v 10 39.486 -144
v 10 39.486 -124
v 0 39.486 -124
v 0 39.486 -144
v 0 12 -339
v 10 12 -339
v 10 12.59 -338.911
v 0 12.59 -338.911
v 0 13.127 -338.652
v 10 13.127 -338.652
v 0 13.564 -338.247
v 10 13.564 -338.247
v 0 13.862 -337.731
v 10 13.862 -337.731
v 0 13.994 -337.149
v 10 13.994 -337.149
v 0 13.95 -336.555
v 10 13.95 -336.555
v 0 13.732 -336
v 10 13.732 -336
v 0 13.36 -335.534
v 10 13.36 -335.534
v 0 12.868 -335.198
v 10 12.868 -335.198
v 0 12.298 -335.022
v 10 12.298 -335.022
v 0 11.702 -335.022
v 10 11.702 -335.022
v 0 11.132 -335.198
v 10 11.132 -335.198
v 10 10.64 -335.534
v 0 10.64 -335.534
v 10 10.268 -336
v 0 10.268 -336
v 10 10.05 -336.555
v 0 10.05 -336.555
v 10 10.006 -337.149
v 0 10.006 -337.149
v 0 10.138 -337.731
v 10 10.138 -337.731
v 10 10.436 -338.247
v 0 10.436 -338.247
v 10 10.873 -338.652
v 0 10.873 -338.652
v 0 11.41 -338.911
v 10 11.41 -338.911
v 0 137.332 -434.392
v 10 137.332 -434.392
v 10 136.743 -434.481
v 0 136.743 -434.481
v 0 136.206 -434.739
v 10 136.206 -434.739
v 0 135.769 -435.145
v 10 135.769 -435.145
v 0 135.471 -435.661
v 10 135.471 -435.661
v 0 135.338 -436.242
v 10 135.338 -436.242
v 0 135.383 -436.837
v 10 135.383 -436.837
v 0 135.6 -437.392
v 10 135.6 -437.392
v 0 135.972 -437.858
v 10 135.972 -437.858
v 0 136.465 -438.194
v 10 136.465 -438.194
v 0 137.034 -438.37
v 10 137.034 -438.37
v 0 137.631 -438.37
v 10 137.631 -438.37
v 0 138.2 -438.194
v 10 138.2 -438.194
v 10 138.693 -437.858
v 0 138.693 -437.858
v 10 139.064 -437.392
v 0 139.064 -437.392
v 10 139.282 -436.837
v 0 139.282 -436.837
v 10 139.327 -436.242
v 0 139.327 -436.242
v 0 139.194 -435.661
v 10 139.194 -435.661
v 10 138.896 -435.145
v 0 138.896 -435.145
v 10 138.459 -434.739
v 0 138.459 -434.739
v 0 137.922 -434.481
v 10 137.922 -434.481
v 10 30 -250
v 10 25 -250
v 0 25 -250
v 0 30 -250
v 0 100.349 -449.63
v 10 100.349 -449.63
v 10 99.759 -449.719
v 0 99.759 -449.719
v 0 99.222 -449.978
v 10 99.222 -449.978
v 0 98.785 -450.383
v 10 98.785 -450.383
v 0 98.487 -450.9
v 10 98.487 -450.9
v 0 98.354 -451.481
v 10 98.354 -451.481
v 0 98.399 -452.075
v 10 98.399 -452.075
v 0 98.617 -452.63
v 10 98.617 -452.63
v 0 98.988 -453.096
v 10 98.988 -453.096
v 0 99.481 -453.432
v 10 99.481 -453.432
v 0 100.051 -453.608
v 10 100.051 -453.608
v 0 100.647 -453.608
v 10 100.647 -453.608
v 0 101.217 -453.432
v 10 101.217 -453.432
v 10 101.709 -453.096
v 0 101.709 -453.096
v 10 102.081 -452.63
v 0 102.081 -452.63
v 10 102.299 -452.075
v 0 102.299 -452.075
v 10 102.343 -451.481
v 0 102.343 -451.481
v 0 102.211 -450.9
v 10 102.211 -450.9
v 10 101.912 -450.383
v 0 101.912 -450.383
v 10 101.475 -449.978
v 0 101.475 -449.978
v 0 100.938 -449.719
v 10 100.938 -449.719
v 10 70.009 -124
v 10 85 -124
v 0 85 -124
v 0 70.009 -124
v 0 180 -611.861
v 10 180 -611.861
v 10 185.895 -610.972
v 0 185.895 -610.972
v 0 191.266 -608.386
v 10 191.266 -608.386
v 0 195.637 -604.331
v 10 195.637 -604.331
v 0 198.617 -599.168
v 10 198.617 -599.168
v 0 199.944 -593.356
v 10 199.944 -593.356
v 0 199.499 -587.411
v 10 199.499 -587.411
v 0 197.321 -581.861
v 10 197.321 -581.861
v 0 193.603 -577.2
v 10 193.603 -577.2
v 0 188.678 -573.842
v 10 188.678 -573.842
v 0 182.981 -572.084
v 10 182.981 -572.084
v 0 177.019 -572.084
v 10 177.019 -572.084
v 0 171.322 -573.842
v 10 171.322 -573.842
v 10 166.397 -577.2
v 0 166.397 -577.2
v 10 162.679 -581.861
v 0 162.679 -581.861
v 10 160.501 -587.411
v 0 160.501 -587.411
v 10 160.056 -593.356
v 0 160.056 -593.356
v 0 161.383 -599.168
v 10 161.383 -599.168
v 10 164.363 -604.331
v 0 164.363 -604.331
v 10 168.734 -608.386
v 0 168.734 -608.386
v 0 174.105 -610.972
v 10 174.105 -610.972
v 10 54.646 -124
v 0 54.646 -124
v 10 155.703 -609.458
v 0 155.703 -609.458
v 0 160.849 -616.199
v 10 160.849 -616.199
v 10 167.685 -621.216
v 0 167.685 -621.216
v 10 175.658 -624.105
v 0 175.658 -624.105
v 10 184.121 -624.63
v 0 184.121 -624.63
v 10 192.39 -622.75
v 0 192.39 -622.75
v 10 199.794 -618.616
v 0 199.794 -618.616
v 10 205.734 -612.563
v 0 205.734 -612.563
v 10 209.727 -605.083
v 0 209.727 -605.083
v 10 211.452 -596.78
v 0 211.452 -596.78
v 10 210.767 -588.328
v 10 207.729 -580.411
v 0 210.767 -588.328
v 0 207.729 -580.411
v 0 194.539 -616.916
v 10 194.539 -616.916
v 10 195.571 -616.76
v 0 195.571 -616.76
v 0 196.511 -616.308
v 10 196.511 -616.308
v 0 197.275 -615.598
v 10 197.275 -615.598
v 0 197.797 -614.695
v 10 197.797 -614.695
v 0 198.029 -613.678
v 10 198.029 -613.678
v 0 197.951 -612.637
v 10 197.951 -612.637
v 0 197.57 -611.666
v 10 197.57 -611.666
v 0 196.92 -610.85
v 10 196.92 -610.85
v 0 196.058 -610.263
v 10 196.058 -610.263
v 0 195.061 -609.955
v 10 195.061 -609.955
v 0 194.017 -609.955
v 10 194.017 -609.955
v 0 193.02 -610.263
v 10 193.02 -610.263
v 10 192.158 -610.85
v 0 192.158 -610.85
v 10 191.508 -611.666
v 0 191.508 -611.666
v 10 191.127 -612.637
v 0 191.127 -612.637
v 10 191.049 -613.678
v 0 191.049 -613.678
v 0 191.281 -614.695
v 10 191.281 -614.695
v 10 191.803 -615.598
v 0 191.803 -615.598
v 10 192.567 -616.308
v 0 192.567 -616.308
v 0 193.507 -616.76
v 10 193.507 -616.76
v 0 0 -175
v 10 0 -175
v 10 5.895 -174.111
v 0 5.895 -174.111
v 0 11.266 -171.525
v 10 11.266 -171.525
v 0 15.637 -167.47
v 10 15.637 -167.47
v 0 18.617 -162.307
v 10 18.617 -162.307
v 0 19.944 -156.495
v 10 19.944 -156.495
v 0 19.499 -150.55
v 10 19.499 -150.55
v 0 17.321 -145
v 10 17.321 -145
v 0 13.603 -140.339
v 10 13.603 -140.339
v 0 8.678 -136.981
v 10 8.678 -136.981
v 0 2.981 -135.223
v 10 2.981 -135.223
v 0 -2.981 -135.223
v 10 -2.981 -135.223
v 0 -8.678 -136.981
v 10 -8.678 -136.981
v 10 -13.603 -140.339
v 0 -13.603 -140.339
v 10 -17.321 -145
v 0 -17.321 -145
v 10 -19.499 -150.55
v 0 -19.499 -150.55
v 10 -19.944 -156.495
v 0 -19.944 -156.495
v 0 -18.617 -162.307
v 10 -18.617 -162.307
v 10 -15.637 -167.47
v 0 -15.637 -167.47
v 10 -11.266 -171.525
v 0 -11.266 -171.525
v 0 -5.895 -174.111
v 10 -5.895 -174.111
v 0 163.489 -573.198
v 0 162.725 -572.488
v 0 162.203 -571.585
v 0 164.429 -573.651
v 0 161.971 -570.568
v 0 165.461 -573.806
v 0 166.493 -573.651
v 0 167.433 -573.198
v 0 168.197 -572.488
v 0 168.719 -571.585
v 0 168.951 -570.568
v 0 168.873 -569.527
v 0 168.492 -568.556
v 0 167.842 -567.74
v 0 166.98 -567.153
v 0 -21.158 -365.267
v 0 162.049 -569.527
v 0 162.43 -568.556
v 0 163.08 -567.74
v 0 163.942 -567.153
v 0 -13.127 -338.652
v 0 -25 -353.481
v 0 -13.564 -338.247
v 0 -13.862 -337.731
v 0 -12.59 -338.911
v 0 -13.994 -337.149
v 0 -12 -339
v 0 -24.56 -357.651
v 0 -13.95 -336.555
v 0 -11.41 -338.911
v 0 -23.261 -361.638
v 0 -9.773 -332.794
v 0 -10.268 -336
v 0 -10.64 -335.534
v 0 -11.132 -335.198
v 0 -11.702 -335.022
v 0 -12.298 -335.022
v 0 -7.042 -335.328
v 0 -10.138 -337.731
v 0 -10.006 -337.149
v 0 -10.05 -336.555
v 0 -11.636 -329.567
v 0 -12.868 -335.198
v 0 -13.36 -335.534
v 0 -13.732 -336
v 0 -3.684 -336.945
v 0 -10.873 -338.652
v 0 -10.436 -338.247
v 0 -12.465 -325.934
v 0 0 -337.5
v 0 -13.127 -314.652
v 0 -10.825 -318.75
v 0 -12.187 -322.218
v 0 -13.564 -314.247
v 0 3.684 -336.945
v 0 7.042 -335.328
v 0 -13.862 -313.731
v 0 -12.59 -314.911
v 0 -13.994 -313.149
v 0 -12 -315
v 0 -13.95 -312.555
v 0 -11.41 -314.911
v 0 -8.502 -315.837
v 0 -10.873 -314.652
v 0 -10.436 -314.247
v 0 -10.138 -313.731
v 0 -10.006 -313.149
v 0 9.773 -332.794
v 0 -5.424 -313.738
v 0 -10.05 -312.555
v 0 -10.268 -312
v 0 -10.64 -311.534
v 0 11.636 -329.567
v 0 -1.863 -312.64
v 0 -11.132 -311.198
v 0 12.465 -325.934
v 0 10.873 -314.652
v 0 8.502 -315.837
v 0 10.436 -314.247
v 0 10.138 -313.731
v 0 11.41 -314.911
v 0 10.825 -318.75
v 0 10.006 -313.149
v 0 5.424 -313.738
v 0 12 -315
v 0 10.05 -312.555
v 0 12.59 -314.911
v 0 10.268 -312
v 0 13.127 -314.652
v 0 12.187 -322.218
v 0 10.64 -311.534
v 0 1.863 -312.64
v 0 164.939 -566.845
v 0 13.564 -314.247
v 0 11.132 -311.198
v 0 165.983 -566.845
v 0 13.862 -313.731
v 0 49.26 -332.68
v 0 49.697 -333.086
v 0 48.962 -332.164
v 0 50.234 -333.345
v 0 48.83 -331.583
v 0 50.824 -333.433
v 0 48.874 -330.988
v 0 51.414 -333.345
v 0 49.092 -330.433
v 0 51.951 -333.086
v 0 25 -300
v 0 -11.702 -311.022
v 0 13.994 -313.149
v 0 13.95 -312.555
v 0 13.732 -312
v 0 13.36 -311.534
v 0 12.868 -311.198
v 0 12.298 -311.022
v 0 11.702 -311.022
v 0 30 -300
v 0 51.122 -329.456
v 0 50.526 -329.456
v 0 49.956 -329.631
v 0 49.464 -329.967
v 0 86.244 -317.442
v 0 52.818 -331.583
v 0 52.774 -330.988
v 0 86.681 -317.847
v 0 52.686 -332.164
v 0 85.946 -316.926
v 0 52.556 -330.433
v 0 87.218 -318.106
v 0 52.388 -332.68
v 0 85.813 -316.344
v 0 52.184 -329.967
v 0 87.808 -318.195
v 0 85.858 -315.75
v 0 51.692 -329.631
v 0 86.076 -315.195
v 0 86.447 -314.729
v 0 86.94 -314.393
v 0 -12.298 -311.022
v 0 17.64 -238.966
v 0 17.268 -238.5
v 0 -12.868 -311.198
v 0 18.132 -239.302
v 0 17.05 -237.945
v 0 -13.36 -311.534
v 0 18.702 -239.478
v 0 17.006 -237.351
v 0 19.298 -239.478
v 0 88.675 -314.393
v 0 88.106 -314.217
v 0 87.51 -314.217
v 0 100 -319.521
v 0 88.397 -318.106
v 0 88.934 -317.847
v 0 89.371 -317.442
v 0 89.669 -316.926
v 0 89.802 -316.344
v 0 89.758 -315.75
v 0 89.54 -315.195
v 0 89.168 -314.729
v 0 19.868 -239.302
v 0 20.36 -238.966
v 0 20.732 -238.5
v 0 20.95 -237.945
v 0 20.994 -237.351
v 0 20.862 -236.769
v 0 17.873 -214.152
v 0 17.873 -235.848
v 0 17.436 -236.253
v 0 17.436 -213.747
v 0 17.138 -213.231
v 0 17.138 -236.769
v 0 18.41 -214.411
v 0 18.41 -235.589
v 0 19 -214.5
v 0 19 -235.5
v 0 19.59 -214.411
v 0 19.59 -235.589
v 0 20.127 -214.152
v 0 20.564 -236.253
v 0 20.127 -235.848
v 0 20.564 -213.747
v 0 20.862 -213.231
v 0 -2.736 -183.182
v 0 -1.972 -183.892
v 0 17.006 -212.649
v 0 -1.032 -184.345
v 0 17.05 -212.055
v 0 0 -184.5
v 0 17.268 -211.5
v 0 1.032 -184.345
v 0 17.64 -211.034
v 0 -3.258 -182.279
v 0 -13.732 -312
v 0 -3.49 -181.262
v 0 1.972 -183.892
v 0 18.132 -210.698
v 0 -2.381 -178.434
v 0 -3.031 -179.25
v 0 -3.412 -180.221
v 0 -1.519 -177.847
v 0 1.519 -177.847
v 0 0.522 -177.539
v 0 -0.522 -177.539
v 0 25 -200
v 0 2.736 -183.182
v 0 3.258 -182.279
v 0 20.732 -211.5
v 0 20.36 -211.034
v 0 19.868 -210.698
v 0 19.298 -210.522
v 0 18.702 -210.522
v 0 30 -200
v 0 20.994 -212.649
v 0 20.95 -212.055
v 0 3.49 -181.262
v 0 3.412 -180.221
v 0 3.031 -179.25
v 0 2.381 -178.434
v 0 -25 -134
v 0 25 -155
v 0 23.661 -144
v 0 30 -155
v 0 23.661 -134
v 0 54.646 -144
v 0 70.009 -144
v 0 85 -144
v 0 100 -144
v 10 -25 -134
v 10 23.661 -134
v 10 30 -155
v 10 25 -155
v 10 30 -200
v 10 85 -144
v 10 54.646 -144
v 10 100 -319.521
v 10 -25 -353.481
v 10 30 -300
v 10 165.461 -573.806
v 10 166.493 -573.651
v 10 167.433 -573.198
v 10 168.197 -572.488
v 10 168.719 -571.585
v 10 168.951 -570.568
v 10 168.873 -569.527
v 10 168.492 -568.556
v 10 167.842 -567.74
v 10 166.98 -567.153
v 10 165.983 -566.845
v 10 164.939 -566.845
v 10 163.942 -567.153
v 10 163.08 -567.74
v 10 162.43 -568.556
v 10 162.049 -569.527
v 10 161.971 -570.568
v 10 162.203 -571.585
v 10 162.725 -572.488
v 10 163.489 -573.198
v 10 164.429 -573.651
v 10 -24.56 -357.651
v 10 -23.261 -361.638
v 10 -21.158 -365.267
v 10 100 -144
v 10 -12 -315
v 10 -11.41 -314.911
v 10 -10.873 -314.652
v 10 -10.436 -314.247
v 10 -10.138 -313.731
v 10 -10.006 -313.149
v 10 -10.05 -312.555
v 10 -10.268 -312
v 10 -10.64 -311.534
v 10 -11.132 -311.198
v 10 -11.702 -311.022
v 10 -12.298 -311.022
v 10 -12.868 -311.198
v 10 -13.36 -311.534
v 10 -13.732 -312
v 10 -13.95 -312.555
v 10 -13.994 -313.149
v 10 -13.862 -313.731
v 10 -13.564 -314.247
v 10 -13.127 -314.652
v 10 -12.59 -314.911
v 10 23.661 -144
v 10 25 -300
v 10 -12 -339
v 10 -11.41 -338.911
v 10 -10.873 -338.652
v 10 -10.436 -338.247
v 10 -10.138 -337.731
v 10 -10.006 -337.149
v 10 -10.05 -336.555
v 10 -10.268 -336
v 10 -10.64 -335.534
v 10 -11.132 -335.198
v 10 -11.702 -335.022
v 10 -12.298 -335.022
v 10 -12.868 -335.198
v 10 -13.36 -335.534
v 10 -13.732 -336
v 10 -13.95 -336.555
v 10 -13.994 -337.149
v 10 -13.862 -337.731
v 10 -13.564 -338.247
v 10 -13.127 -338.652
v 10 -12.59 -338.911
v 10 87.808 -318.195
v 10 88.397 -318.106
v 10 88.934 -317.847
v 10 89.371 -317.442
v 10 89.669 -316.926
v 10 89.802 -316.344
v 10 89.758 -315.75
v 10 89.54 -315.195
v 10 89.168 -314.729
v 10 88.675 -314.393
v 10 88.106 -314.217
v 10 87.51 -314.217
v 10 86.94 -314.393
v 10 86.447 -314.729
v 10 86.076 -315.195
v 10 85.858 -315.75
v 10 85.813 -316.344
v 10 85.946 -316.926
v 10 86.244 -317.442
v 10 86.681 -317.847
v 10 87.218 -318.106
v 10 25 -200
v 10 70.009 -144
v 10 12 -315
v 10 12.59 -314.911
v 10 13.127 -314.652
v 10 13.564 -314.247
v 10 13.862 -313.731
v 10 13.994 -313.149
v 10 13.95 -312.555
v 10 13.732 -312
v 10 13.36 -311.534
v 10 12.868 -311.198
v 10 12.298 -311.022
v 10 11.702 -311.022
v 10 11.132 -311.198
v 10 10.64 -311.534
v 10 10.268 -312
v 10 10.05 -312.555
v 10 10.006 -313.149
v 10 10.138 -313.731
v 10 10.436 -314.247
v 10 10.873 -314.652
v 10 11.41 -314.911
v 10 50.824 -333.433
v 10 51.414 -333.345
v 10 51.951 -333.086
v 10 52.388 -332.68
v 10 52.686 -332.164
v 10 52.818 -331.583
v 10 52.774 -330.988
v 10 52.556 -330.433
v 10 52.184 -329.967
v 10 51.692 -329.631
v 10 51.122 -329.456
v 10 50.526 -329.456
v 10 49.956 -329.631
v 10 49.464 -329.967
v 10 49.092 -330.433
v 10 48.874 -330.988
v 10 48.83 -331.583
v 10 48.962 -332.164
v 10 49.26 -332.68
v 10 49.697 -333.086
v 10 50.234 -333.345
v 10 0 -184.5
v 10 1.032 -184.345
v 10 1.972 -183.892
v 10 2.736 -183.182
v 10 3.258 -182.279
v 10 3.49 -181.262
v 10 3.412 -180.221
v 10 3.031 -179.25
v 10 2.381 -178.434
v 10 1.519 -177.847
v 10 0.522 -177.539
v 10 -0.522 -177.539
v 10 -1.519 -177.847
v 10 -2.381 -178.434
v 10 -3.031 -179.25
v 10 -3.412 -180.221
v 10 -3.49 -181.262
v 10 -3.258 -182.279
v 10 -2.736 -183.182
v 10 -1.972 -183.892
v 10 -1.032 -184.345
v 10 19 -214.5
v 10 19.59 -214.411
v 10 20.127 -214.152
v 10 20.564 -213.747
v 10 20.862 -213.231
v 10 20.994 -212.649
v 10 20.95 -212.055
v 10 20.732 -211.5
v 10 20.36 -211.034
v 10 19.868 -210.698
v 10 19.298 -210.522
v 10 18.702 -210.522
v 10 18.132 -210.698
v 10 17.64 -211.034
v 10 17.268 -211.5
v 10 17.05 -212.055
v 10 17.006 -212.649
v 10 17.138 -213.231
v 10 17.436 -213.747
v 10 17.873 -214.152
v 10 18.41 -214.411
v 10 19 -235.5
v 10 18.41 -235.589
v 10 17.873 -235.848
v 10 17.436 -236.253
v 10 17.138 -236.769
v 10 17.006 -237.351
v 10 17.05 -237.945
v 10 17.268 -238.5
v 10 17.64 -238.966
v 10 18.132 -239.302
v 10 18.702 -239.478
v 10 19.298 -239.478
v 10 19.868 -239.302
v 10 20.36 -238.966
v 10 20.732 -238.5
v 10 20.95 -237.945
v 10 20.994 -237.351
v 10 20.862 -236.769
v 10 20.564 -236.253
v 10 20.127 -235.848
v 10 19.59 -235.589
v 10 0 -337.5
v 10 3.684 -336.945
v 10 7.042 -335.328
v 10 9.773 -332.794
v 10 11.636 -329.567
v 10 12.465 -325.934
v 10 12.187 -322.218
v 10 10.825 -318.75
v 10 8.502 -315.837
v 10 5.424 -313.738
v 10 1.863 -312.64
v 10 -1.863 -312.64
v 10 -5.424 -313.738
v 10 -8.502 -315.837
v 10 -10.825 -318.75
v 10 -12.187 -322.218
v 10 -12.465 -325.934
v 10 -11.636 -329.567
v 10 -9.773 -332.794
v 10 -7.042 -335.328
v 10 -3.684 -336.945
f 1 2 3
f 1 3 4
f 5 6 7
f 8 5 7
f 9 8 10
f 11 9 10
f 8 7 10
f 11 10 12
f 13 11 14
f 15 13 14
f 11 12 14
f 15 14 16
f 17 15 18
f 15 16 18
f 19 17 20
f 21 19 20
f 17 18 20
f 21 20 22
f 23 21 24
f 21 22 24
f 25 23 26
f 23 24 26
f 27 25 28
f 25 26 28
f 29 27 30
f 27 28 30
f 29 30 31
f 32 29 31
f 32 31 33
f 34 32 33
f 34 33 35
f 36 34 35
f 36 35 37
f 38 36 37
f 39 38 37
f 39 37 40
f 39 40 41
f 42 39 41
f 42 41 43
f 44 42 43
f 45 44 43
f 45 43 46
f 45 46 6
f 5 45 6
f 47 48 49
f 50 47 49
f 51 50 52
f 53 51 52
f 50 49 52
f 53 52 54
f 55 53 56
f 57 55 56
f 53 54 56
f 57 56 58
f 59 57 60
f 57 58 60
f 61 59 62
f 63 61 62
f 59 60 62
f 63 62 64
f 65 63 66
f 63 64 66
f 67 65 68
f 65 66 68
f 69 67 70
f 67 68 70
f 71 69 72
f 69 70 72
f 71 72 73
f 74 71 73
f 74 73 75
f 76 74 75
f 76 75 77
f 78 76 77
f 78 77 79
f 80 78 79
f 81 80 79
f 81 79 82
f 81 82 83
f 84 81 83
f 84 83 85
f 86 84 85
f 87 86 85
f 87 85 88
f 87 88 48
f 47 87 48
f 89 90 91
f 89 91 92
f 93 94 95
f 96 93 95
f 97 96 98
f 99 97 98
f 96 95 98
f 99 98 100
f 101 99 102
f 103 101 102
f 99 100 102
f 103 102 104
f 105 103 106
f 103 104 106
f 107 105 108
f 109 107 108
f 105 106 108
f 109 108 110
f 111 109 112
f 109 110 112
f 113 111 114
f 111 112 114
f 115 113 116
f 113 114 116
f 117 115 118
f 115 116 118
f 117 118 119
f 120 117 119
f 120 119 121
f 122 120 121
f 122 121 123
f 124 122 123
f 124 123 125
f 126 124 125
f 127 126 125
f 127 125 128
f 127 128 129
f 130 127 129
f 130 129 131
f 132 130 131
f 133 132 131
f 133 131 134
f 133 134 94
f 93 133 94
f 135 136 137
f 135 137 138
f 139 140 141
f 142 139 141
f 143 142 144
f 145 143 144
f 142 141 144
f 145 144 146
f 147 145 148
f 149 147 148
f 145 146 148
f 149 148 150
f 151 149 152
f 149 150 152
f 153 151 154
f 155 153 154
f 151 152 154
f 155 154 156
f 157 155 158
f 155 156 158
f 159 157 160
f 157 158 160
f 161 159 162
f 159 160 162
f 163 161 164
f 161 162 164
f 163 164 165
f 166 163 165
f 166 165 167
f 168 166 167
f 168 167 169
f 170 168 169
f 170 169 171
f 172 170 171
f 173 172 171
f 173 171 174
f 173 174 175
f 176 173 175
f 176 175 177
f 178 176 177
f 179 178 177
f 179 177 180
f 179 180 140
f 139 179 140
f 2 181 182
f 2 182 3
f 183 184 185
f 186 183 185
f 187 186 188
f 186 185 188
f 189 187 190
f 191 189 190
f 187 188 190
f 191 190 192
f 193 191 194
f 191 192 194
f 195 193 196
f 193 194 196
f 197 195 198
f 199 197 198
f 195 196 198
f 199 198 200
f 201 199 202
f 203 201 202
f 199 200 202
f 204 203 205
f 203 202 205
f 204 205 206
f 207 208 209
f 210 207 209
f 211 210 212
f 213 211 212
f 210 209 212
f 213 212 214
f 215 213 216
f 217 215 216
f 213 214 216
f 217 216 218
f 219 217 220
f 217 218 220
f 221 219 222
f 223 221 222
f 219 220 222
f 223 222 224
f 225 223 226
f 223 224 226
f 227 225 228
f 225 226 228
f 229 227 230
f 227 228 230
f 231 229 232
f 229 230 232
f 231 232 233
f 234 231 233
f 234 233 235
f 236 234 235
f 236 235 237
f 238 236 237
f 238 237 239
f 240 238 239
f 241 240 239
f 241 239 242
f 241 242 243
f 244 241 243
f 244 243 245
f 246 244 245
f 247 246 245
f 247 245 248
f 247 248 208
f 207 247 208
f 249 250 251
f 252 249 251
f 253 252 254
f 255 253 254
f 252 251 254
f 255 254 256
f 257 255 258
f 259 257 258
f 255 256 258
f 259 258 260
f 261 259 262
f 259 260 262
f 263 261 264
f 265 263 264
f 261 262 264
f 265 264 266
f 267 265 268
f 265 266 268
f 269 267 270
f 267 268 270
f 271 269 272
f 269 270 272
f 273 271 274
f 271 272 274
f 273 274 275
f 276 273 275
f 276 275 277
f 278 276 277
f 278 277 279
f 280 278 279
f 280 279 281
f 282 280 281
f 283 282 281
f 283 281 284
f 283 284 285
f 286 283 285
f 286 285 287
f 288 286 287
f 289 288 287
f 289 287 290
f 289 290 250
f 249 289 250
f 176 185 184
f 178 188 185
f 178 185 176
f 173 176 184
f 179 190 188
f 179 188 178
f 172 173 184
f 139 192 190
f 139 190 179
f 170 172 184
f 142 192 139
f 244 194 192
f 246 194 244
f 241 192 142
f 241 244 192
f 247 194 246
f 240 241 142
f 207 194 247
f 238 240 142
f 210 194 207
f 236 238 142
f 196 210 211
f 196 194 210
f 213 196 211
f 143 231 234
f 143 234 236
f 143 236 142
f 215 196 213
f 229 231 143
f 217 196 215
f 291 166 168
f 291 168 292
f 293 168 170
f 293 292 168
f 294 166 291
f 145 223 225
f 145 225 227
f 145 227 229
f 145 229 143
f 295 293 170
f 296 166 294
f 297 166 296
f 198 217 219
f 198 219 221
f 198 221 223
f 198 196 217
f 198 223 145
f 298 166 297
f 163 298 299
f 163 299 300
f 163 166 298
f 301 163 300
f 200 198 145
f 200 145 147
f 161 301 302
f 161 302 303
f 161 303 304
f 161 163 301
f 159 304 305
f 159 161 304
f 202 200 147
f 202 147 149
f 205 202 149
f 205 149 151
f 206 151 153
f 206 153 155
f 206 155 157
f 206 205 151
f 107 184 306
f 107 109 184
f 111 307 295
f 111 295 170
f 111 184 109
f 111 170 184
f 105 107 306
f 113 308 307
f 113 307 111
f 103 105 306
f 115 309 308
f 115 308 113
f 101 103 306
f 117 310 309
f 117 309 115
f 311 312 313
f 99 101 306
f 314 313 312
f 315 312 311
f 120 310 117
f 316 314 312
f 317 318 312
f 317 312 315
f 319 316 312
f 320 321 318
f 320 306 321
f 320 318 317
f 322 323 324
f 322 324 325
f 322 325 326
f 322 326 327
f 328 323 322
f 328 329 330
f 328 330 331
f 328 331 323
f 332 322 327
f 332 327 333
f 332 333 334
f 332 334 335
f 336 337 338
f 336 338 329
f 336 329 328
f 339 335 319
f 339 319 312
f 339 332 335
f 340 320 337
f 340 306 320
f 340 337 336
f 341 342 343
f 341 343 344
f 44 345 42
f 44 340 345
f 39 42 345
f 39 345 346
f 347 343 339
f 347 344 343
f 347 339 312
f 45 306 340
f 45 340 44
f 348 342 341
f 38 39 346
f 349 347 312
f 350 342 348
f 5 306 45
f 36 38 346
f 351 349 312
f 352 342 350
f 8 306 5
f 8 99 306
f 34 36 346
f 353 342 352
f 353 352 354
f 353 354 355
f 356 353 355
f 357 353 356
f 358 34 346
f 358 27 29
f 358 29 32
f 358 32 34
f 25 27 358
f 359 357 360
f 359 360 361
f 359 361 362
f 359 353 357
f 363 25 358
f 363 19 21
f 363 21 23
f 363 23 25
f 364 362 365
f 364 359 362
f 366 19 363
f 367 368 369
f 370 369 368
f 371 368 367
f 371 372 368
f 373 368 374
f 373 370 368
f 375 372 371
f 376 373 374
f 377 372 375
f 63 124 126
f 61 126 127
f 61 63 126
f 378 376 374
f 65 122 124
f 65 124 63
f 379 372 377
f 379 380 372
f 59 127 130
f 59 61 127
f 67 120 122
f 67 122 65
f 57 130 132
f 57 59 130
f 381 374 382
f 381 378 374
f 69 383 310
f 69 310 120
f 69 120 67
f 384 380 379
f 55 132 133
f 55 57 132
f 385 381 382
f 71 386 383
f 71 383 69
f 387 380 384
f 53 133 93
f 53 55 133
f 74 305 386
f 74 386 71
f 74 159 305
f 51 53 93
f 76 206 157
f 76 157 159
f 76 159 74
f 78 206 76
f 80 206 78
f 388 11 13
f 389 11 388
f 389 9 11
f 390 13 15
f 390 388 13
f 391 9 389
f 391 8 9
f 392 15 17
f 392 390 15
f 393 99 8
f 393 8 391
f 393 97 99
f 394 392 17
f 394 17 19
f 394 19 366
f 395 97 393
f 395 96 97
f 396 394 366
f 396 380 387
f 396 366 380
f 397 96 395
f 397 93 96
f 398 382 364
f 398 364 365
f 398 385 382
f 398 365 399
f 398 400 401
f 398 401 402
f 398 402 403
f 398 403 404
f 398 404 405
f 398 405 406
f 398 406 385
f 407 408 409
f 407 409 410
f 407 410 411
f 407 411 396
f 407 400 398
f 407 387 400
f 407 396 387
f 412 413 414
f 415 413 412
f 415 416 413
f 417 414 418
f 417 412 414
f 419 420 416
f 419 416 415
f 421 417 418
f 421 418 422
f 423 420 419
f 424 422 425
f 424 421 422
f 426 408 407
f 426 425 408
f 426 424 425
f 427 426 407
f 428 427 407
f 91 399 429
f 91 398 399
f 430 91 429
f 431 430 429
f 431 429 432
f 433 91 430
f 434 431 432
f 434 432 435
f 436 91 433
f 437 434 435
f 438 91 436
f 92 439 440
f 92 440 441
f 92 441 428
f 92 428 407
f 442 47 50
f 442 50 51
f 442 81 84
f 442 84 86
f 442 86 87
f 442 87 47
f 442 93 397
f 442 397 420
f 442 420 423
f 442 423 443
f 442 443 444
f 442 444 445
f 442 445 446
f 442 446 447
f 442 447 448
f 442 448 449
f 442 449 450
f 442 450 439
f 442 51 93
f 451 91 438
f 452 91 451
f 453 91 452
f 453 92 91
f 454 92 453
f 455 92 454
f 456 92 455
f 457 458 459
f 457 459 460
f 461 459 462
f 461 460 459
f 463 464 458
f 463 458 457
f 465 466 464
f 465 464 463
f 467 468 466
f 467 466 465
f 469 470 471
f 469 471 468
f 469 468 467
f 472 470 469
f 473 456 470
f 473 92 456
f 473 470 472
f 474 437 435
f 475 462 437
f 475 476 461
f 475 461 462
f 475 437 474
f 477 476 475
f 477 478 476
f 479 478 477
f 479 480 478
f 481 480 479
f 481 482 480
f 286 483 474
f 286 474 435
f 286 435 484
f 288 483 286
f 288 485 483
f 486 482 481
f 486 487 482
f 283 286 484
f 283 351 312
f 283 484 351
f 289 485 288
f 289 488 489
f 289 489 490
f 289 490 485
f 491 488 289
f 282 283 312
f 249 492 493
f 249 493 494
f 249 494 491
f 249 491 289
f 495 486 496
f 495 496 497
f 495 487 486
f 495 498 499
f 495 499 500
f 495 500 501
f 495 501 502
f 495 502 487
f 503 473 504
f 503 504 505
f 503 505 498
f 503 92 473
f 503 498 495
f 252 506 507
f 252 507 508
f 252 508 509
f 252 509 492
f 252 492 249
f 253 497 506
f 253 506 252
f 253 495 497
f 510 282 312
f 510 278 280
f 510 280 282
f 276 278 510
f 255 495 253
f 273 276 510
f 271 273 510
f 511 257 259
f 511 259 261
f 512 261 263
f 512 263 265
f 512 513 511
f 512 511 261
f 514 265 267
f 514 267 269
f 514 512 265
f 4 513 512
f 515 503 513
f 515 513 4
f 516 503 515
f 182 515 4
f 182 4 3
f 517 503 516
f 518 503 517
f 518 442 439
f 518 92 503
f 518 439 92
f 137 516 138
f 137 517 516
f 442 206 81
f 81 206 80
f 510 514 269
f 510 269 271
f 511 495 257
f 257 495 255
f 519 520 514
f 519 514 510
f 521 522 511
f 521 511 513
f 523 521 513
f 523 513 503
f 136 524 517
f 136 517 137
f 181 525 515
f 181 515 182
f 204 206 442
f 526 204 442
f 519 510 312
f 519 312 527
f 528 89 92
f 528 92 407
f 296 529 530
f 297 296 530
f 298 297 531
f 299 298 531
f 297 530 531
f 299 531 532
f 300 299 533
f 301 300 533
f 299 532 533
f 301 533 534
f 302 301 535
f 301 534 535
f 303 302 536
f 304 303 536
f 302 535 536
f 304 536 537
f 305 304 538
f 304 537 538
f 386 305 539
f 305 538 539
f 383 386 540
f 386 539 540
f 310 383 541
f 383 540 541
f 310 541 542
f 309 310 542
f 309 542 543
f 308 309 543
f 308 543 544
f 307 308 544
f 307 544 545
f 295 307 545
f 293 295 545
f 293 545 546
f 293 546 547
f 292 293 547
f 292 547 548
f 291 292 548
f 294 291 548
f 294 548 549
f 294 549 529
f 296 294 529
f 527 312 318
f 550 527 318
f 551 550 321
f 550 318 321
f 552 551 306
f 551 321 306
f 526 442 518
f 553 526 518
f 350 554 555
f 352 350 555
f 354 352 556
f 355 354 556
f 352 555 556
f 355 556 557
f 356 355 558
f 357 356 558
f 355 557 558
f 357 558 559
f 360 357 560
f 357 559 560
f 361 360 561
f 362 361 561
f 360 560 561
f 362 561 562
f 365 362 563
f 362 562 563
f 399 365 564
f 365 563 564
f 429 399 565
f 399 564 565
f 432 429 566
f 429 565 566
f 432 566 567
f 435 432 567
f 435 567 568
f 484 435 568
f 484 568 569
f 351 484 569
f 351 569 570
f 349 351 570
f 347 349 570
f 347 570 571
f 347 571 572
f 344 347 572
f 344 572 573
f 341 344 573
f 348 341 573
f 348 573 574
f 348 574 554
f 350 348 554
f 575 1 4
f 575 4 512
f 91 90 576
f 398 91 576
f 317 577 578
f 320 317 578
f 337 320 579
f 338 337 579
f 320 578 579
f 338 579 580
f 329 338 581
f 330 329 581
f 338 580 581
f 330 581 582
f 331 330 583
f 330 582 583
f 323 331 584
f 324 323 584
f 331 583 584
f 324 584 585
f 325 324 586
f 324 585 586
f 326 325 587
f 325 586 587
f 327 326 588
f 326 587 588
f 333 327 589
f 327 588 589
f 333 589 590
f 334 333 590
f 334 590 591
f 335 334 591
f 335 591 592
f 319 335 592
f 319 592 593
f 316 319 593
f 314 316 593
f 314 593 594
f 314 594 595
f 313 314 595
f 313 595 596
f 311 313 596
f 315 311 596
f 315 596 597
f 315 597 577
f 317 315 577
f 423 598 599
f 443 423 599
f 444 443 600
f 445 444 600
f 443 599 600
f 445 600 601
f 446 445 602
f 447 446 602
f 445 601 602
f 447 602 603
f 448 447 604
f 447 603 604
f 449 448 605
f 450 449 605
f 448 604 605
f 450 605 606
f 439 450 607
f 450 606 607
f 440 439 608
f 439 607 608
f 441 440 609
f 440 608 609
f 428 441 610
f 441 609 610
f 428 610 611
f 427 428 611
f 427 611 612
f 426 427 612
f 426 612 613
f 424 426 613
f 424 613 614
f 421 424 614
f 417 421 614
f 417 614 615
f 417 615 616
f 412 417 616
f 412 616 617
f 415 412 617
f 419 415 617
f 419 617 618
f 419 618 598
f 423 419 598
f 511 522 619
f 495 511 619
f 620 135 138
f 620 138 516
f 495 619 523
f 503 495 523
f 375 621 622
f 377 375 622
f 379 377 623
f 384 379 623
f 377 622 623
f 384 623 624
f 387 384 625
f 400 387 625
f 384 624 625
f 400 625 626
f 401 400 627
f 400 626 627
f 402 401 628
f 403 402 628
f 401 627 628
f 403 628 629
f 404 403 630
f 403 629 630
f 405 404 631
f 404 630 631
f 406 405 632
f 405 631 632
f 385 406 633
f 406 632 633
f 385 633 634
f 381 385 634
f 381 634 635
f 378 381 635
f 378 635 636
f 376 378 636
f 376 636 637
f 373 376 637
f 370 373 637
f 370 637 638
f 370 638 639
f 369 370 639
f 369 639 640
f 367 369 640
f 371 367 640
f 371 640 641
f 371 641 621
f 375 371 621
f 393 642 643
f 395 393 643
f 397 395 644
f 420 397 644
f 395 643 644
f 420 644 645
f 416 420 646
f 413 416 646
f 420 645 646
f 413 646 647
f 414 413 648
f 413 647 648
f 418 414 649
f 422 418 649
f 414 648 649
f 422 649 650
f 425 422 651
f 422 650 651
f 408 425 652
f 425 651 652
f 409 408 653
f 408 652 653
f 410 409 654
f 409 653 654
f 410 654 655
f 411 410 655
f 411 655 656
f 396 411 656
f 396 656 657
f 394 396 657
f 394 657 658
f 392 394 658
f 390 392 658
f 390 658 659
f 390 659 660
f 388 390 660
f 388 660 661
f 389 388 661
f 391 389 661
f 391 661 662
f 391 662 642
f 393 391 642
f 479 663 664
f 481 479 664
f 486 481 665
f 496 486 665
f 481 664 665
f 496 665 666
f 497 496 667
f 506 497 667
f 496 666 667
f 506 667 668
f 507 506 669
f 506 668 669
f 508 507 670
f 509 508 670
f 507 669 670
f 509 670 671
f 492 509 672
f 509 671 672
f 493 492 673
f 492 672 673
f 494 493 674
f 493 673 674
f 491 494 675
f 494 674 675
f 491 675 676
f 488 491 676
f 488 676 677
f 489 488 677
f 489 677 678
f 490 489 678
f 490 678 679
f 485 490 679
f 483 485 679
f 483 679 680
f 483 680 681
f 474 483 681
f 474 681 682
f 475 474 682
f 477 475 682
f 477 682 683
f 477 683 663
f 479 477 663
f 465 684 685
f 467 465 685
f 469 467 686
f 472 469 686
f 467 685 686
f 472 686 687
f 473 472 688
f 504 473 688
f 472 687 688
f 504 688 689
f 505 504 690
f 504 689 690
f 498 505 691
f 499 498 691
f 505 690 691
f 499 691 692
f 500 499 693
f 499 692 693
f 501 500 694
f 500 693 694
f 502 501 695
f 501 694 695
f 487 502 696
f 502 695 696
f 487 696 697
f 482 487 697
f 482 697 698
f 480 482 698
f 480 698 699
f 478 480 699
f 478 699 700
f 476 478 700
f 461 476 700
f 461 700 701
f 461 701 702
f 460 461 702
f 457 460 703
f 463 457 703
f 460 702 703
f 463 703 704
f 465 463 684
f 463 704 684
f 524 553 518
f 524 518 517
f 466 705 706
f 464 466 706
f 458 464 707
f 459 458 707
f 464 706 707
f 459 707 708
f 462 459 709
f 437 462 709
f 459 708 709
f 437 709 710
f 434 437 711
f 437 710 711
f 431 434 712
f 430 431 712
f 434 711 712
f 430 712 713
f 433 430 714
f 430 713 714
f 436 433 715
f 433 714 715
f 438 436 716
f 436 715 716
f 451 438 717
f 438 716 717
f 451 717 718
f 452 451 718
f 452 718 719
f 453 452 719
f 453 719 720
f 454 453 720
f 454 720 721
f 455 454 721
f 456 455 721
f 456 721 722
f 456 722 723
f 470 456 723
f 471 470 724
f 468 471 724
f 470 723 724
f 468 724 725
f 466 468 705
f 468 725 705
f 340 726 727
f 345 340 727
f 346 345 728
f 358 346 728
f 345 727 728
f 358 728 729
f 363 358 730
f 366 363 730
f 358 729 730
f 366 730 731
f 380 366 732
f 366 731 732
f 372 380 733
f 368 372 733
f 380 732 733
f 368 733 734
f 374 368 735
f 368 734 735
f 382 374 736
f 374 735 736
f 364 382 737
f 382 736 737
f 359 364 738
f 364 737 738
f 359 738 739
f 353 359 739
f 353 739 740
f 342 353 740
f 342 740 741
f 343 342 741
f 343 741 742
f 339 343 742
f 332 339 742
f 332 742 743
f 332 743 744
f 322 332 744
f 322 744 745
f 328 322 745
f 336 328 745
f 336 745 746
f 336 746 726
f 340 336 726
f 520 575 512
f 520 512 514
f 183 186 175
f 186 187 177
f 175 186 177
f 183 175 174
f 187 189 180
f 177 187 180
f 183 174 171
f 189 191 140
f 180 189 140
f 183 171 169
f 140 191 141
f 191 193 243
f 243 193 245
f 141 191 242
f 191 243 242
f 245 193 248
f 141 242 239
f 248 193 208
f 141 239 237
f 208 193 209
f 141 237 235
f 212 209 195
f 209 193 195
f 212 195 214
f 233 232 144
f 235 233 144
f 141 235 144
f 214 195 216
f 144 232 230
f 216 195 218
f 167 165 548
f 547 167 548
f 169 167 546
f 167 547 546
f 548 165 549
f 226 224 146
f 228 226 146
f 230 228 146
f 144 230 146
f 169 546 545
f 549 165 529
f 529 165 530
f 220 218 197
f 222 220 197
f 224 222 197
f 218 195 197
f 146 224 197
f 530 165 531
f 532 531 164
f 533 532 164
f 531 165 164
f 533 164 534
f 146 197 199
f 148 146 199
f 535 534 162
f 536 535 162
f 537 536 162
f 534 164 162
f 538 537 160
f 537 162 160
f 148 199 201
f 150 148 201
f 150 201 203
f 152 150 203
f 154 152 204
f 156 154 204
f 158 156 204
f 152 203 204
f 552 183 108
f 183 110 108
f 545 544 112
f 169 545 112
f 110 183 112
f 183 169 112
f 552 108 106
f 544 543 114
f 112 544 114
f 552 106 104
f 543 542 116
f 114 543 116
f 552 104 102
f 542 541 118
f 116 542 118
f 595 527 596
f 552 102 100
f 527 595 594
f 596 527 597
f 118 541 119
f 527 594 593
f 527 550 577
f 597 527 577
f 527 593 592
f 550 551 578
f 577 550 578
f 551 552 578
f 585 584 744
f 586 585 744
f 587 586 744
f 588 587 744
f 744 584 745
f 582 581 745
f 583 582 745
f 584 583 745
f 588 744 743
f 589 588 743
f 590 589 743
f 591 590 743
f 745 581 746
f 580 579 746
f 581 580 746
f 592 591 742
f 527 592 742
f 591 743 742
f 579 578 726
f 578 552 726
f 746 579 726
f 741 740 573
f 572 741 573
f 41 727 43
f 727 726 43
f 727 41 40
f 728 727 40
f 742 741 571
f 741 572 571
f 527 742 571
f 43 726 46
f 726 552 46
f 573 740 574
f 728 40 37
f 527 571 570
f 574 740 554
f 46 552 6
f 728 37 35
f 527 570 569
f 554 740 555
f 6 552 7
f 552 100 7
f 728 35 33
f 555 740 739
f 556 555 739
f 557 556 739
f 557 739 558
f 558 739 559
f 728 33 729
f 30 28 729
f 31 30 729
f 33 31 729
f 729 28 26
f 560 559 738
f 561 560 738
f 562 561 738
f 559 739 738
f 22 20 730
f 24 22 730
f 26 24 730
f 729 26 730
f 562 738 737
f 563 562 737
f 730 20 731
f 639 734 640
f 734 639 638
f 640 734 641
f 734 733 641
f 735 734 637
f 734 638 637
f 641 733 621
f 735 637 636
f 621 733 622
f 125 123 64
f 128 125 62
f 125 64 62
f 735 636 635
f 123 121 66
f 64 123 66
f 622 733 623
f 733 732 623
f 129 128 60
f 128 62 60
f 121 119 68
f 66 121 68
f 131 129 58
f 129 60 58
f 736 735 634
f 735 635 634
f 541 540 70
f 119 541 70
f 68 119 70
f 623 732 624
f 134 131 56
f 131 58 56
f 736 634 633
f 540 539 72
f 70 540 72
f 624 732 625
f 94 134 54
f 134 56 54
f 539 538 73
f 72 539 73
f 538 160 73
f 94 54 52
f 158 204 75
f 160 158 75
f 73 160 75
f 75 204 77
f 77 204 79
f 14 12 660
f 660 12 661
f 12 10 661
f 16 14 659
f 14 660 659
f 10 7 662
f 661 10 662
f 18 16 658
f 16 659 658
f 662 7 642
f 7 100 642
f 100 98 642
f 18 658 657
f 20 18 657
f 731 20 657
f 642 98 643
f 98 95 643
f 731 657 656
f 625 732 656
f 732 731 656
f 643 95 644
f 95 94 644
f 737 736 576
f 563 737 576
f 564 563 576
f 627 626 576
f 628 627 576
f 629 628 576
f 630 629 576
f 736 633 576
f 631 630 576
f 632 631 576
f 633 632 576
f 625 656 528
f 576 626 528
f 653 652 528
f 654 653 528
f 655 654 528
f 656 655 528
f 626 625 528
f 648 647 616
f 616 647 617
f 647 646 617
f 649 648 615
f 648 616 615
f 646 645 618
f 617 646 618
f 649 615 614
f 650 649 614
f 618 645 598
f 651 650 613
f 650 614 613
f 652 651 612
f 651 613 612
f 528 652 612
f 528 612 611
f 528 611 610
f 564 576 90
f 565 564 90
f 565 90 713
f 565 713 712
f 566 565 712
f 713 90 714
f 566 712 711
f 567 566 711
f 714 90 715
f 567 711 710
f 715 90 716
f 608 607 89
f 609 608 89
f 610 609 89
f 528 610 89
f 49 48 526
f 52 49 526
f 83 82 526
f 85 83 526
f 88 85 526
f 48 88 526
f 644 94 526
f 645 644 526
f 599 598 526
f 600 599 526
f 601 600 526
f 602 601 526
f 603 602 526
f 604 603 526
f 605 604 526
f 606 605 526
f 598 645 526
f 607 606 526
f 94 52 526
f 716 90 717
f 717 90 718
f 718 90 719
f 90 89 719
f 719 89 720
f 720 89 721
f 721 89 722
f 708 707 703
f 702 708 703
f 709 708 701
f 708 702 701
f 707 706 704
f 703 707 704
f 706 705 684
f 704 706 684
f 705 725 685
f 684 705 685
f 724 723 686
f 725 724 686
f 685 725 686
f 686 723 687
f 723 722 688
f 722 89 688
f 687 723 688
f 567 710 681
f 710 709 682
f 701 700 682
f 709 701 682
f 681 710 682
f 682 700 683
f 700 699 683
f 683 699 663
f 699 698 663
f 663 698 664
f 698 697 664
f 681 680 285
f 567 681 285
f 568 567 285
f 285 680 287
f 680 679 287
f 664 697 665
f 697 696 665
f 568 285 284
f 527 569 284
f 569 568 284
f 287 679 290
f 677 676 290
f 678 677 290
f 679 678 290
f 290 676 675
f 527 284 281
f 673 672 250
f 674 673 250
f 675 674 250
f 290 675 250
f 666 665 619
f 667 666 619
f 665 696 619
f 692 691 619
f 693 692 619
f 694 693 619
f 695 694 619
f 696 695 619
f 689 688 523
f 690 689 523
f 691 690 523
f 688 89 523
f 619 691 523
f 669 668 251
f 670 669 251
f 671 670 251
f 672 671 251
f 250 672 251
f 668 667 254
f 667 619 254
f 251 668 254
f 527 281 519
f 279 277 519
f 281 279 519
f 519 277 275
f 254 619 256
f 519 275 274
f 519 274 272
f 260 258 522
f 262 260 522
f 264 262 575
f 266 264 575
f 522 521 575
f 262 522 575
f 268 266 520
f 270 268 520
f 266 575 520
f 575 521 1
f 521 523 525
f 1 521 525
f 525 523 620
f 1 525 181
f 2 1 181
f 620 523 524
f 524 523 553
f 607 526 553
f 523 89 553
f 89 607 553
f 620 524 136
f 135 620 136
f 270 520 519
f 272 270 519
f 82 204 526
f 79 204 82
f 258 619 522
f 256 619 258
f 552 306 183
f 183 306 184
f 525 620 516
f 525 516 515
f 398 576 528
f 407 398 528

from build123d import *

# Parameters (mm, degrees)
EXTRUDE_2_DEPTH      = 10
SKETCH_3_R           = 3.5
SKETCH_3_R_2         = 20
SKETCH_3_R_3         = 2
SKETCH_3_R_4         = 12.5
CUT_EXTRUDE_1_DEPTH  = 660.636515889
SKETCH_6_W           = 10
SKETCH_6_H           = 50
CUT_EXTRUDE_14_DEPTH = 5
SKETCH_7_W           = 45
SKETCH_7_H           = 5
SKETCH_7_W_2         = 50
CUT_EXTRUDE_17_DEPTH = 660.636515889
SKETCH_4_R           = 2
CUT_EXTRUDE_18_DEPTH = 10
SKETCH_8_W           = 10
SKETCH_8_H           = 55
EXTRUDE_3_DEPTH      = 10
SKETCH_9_R           = 3.5
SKETCH_9_R_2         = 20
CUT_EXTRUDE_19_DEPTH = 660.636515889
EXTRUDE_4_DEPTH      = 10
SKETCH_14_R          = 20
SKETCH_14_R_2        = 3
CUT_EXTRUDE_20_DEPTH = 660.636515889
SKETCH_15_R          = 2
CUT_EXTRUDE_22_DEPTH = 660.636515889
CUT_EXTRUDE_26_DEPTH = 660.636515889


with BuildPart() as part:
    # 스케치1 → 보스-돌출2 (new body)
    with BuildSketch(Plane(origin=(0, 0, 0), x_dir=(0, 0, -1), z_dir=(1, 0, 0))):
        with BuildLine():
            Line((-350, -25), (353.480885827, -25))
            ThreePointArc((353.480885827, -25), (359.679041929, -24.015332259), (365.266885594, -21.158286093))
            Line((365.266885594, -21.158286093), (609.458437468, 155.703306991))
            ThreePointArc((609.458437468, 155.703306991), (620.947494037, 196.239910069), (580.410890959, 207.728966637))
            Line((580.410890959, 207.728966637), (150, 30))
            Line((150, 30), (-350, 30))
            Line((-350, 30), (-350, -25))
        make_face()
    extrude(amount=EXTRUDE_2_DEPTH)

    # 스케치3 → 컷-돌출1 (cut, through all)
    with BuildSketch(Plane(origin=(10, 0, 0), x_dir=(0, 0, -1), z_dir=(1, 0, 0))):
        with Locations((613.415951219, 194.53901549)):
            Circle(SKETCH_3_R)
        with Locations((570.305997446, 165.46098451)):
            Circle(SKETCH_3_R)
        with Locations((591.860974332, 180)):
            Circle(SKETCH_3_R_2)
        with Locations((337, -12)):
            Circle(SKETCH_3_R_3)
        with Locations((313, 12)):
            Circle(SKETCH_3_R_3)
        with Locations((313, -12)):
            Circle(SKETCH_3_R_3)
        with Locations((337, 12)):
            Circle(SKETCH_3_R_3)
        with Locations((325, 0)):
            Circle(SKETCH_3_R_4)
        with Locations((-313, -12)):
            Circle(SKETCH_3_R_3)
        with Locations((-313, 12)):
            Circle(SKETCH_3_R_3)
        with Locations((-325, 0)):
            Circle(SKETCH_3_R_4)
        with Locations((-337, -12)):
            Circle(SKETCH_3_R_3)
        with Locations((-337, 12)):
            Circle(SKETCH_3_R_3)
    extrude(amount=-CUT_EXTRUDE_1_DEPTH, mode=Mode.SUBTRACT)

    # 스케치6 → 컷-돌출14 (cut)
    with BuildSketch(Plane(origin=(0, 30, 0), x_dir=(1, 0, 0), z_dir=(0, 1, 0))):
        with Locations((5, -75)):
            Rectangle(SKETCH_6_W, SKETCH_6_H)
        with Locations((5, -275)):
            Rectangle(SKETCH_6_W, SKETCH_6_H)
        with Locations((5, 75)):
            Rectangle(SKETCH_6_W, SKETCH_6_H)
        with Locations((5, -175)):
            Rectangle(SKETCH_6_W, SKETCH_6_H)
    extrude(amount=-CUT_EXTRUDE_14_DEPTH, mode=Mode.SUBTRACT)

    # 스케치7 → 컷-돌출17 (cut, through all)
    with BuildSketch(Plane(origin=(10, 0, 0), x_dir=(0, 0, -1), z_dir=(1, 0, 0))):
        with Locations((177.5, 27.5)):
            Rectangle(SKETCH_7_W, SKETCH_7_H)
        with Locations((275, 27.5)):
            Rectangle(SKETCH_7_W_2, SKETCH_7_H)
    extrude(amount=-CUT_EXTRUDE_17_DEPTH, mode=Mode.SUBTRACT)

    # 스케치4 → 컷-돌출18 (cut)
    with BuildSketch(Plane(origin=(10, 0, 0), x_dir=(0, 0, -1), z_dir=(1, 0, 0))):
        with Locations((-237.5, 19)):
            Circle(SKETCH_4_R)
        with Locations(Location((-212.5, 19, 0), (0, 0, 180))):
            Circle(SKETCH_4_R)
        with Locations((-139.996213119, 19)):
            Circle(SKETCH_4_R)
        with Locations(Location((-114.996213119, 19, 0), (0, 0, 180))):
            Circle(SKETCH_4_R)
        with Locations((112.5, 19)):
            Circle(SKETCH_4_R)
        with Locations((212.5, 19)):
            Circle(SKETCH_4_R)
        with Locations(Location((237.5, 19, 0), (0, 0, 180))):
            Circle(SKETCH_4_R)
    extrude(amount=-CUT_EXTRUDE_18_DEPTH, mode=Mode.SUBTRACT)

    # 스케치8 → 보스-돌출3 (add)
    with BuildSketch(Plane.XY.offset(350)):
        with Locations((5, 2.5)):
            Rectangle(SKETCH_8_W, SKETCH_8_H)
    extrude(amount=EXTRUDE_3_DEPTH)

    # 스케치9 → 컷-돌출19 (cut, through all)
    with BuildSketch(Plane(origin=(10, 0, 0), x_dir=(0, 0, -1), z_dir=(1, 0, 0))):
        with Locations((-92.5, 0)):
            Circle(SKETCH_9_R)
        with Locations(Location((-40.5, 0, 0), (0, 0, 180))):
            Circle(SKETCH_9_R)
        with Locations(Location((-66.5, 0, 0), (0, 0, 180))):
            Circle(SKETCH_9_R_2)
        with Locations((155, 0)):
            Circle(SKETCH_9_R_2)
        with Locations((181, 0)):
            Circle(SKETCH_9_R)
        with Locations(Location((129, 0, 0), (0, 0, 180))):
            Circle(SKETCH_9_R)
    extrude(amount=-CUT_EXTRUDE_19_DEPTH, mode=Mode.SUBTRACT)

    # 스케치10 → 보스-돌출4 (add)
    with BuildSketch(Plane(origin=(0, 0, 0), x_dir=(0, 0, -1), z_dir=(1, 0, 0))):
        Polygon((100, 30), (100, 25), (50, 25), (50, 30), (-50, 30), (-360, 30), (-360, 100), (-50, 100), (319.520832407, 100), (150, 30), align=None)
    extrude(amount=EXTRUDE_4_DEPTH)

    # 스케치14 → 컷-돌출20 (cut, through all)
    with BuildSketch(Plane(origin=(10, 0, 0), x_dir=(0, 0, -1), z_dir=(1, 0, 0))):
        with Locations((44.25, 11)):
            Circle(SKETCH_14_R)
        with Locations((70.25, 11)):
            Circle(SKETCH_14_R_2)
        with Locations(Location((18.25, 11, 0), (0, 0, 180))):
            Circle(SKETCH_14_R_2)
    extrude(amount=-CUT_EXTRUDE_20_DEPTH, mode=Mode.SUBTRACT)

    # 스케치15 → 컷-돌출22 (cut, through all)
    with BuildSketch(Plane(origin=(10, 0, 0), x_dir=(0, 0, -1), z_dir=(1, 0, 0))):
        with Locations((331.433412373, 50.824001827)):
            Circle(SKETCH_15_R)
        with Locations((316.195018887, 87.807665301)):
            Circle(SKETCH_15_R)
        with Locations(Location((451.630318664, 100.348780655, 0), (0, 0, 180))):
            Circle(SKETCH_15_R)
        with Locations(Location((436.391925178, 137.332444129, 0), (0, 0, 180))):
            Circle(SKETCH_15_R)
    extrude(amount=-CUT_EXTRUDE_22_DEPTH, mode=Mode.SUBTRACT)

    # 스케치17 → 컷-돌출26 (cut, through all)
    with BuildSketch(Plane(origin=(10, 0, 0), x_dir=(0, 0, -1), z_dir=(1, 0, 0))):
        Polygon((134, 100), (144, 100), (144, 85), (124, 85), (124, 70.009449614), (144, 70.009449614), (144, 54.646019177), (124, 54.646019177), (124, 39.485590498), (144, 39.485590498), (144, 23.660735911), (134, 23.660735911), (134, -25.259204994), (-374.726859986, -25.259204994), (-374.726859986, 260.6847899), (134, 260.6847899), align=None)
    extrude(amount=-CUT_EXTRUDE_26_DEPTH, mode=Mode.SUBTRACT)


solid = part.part
